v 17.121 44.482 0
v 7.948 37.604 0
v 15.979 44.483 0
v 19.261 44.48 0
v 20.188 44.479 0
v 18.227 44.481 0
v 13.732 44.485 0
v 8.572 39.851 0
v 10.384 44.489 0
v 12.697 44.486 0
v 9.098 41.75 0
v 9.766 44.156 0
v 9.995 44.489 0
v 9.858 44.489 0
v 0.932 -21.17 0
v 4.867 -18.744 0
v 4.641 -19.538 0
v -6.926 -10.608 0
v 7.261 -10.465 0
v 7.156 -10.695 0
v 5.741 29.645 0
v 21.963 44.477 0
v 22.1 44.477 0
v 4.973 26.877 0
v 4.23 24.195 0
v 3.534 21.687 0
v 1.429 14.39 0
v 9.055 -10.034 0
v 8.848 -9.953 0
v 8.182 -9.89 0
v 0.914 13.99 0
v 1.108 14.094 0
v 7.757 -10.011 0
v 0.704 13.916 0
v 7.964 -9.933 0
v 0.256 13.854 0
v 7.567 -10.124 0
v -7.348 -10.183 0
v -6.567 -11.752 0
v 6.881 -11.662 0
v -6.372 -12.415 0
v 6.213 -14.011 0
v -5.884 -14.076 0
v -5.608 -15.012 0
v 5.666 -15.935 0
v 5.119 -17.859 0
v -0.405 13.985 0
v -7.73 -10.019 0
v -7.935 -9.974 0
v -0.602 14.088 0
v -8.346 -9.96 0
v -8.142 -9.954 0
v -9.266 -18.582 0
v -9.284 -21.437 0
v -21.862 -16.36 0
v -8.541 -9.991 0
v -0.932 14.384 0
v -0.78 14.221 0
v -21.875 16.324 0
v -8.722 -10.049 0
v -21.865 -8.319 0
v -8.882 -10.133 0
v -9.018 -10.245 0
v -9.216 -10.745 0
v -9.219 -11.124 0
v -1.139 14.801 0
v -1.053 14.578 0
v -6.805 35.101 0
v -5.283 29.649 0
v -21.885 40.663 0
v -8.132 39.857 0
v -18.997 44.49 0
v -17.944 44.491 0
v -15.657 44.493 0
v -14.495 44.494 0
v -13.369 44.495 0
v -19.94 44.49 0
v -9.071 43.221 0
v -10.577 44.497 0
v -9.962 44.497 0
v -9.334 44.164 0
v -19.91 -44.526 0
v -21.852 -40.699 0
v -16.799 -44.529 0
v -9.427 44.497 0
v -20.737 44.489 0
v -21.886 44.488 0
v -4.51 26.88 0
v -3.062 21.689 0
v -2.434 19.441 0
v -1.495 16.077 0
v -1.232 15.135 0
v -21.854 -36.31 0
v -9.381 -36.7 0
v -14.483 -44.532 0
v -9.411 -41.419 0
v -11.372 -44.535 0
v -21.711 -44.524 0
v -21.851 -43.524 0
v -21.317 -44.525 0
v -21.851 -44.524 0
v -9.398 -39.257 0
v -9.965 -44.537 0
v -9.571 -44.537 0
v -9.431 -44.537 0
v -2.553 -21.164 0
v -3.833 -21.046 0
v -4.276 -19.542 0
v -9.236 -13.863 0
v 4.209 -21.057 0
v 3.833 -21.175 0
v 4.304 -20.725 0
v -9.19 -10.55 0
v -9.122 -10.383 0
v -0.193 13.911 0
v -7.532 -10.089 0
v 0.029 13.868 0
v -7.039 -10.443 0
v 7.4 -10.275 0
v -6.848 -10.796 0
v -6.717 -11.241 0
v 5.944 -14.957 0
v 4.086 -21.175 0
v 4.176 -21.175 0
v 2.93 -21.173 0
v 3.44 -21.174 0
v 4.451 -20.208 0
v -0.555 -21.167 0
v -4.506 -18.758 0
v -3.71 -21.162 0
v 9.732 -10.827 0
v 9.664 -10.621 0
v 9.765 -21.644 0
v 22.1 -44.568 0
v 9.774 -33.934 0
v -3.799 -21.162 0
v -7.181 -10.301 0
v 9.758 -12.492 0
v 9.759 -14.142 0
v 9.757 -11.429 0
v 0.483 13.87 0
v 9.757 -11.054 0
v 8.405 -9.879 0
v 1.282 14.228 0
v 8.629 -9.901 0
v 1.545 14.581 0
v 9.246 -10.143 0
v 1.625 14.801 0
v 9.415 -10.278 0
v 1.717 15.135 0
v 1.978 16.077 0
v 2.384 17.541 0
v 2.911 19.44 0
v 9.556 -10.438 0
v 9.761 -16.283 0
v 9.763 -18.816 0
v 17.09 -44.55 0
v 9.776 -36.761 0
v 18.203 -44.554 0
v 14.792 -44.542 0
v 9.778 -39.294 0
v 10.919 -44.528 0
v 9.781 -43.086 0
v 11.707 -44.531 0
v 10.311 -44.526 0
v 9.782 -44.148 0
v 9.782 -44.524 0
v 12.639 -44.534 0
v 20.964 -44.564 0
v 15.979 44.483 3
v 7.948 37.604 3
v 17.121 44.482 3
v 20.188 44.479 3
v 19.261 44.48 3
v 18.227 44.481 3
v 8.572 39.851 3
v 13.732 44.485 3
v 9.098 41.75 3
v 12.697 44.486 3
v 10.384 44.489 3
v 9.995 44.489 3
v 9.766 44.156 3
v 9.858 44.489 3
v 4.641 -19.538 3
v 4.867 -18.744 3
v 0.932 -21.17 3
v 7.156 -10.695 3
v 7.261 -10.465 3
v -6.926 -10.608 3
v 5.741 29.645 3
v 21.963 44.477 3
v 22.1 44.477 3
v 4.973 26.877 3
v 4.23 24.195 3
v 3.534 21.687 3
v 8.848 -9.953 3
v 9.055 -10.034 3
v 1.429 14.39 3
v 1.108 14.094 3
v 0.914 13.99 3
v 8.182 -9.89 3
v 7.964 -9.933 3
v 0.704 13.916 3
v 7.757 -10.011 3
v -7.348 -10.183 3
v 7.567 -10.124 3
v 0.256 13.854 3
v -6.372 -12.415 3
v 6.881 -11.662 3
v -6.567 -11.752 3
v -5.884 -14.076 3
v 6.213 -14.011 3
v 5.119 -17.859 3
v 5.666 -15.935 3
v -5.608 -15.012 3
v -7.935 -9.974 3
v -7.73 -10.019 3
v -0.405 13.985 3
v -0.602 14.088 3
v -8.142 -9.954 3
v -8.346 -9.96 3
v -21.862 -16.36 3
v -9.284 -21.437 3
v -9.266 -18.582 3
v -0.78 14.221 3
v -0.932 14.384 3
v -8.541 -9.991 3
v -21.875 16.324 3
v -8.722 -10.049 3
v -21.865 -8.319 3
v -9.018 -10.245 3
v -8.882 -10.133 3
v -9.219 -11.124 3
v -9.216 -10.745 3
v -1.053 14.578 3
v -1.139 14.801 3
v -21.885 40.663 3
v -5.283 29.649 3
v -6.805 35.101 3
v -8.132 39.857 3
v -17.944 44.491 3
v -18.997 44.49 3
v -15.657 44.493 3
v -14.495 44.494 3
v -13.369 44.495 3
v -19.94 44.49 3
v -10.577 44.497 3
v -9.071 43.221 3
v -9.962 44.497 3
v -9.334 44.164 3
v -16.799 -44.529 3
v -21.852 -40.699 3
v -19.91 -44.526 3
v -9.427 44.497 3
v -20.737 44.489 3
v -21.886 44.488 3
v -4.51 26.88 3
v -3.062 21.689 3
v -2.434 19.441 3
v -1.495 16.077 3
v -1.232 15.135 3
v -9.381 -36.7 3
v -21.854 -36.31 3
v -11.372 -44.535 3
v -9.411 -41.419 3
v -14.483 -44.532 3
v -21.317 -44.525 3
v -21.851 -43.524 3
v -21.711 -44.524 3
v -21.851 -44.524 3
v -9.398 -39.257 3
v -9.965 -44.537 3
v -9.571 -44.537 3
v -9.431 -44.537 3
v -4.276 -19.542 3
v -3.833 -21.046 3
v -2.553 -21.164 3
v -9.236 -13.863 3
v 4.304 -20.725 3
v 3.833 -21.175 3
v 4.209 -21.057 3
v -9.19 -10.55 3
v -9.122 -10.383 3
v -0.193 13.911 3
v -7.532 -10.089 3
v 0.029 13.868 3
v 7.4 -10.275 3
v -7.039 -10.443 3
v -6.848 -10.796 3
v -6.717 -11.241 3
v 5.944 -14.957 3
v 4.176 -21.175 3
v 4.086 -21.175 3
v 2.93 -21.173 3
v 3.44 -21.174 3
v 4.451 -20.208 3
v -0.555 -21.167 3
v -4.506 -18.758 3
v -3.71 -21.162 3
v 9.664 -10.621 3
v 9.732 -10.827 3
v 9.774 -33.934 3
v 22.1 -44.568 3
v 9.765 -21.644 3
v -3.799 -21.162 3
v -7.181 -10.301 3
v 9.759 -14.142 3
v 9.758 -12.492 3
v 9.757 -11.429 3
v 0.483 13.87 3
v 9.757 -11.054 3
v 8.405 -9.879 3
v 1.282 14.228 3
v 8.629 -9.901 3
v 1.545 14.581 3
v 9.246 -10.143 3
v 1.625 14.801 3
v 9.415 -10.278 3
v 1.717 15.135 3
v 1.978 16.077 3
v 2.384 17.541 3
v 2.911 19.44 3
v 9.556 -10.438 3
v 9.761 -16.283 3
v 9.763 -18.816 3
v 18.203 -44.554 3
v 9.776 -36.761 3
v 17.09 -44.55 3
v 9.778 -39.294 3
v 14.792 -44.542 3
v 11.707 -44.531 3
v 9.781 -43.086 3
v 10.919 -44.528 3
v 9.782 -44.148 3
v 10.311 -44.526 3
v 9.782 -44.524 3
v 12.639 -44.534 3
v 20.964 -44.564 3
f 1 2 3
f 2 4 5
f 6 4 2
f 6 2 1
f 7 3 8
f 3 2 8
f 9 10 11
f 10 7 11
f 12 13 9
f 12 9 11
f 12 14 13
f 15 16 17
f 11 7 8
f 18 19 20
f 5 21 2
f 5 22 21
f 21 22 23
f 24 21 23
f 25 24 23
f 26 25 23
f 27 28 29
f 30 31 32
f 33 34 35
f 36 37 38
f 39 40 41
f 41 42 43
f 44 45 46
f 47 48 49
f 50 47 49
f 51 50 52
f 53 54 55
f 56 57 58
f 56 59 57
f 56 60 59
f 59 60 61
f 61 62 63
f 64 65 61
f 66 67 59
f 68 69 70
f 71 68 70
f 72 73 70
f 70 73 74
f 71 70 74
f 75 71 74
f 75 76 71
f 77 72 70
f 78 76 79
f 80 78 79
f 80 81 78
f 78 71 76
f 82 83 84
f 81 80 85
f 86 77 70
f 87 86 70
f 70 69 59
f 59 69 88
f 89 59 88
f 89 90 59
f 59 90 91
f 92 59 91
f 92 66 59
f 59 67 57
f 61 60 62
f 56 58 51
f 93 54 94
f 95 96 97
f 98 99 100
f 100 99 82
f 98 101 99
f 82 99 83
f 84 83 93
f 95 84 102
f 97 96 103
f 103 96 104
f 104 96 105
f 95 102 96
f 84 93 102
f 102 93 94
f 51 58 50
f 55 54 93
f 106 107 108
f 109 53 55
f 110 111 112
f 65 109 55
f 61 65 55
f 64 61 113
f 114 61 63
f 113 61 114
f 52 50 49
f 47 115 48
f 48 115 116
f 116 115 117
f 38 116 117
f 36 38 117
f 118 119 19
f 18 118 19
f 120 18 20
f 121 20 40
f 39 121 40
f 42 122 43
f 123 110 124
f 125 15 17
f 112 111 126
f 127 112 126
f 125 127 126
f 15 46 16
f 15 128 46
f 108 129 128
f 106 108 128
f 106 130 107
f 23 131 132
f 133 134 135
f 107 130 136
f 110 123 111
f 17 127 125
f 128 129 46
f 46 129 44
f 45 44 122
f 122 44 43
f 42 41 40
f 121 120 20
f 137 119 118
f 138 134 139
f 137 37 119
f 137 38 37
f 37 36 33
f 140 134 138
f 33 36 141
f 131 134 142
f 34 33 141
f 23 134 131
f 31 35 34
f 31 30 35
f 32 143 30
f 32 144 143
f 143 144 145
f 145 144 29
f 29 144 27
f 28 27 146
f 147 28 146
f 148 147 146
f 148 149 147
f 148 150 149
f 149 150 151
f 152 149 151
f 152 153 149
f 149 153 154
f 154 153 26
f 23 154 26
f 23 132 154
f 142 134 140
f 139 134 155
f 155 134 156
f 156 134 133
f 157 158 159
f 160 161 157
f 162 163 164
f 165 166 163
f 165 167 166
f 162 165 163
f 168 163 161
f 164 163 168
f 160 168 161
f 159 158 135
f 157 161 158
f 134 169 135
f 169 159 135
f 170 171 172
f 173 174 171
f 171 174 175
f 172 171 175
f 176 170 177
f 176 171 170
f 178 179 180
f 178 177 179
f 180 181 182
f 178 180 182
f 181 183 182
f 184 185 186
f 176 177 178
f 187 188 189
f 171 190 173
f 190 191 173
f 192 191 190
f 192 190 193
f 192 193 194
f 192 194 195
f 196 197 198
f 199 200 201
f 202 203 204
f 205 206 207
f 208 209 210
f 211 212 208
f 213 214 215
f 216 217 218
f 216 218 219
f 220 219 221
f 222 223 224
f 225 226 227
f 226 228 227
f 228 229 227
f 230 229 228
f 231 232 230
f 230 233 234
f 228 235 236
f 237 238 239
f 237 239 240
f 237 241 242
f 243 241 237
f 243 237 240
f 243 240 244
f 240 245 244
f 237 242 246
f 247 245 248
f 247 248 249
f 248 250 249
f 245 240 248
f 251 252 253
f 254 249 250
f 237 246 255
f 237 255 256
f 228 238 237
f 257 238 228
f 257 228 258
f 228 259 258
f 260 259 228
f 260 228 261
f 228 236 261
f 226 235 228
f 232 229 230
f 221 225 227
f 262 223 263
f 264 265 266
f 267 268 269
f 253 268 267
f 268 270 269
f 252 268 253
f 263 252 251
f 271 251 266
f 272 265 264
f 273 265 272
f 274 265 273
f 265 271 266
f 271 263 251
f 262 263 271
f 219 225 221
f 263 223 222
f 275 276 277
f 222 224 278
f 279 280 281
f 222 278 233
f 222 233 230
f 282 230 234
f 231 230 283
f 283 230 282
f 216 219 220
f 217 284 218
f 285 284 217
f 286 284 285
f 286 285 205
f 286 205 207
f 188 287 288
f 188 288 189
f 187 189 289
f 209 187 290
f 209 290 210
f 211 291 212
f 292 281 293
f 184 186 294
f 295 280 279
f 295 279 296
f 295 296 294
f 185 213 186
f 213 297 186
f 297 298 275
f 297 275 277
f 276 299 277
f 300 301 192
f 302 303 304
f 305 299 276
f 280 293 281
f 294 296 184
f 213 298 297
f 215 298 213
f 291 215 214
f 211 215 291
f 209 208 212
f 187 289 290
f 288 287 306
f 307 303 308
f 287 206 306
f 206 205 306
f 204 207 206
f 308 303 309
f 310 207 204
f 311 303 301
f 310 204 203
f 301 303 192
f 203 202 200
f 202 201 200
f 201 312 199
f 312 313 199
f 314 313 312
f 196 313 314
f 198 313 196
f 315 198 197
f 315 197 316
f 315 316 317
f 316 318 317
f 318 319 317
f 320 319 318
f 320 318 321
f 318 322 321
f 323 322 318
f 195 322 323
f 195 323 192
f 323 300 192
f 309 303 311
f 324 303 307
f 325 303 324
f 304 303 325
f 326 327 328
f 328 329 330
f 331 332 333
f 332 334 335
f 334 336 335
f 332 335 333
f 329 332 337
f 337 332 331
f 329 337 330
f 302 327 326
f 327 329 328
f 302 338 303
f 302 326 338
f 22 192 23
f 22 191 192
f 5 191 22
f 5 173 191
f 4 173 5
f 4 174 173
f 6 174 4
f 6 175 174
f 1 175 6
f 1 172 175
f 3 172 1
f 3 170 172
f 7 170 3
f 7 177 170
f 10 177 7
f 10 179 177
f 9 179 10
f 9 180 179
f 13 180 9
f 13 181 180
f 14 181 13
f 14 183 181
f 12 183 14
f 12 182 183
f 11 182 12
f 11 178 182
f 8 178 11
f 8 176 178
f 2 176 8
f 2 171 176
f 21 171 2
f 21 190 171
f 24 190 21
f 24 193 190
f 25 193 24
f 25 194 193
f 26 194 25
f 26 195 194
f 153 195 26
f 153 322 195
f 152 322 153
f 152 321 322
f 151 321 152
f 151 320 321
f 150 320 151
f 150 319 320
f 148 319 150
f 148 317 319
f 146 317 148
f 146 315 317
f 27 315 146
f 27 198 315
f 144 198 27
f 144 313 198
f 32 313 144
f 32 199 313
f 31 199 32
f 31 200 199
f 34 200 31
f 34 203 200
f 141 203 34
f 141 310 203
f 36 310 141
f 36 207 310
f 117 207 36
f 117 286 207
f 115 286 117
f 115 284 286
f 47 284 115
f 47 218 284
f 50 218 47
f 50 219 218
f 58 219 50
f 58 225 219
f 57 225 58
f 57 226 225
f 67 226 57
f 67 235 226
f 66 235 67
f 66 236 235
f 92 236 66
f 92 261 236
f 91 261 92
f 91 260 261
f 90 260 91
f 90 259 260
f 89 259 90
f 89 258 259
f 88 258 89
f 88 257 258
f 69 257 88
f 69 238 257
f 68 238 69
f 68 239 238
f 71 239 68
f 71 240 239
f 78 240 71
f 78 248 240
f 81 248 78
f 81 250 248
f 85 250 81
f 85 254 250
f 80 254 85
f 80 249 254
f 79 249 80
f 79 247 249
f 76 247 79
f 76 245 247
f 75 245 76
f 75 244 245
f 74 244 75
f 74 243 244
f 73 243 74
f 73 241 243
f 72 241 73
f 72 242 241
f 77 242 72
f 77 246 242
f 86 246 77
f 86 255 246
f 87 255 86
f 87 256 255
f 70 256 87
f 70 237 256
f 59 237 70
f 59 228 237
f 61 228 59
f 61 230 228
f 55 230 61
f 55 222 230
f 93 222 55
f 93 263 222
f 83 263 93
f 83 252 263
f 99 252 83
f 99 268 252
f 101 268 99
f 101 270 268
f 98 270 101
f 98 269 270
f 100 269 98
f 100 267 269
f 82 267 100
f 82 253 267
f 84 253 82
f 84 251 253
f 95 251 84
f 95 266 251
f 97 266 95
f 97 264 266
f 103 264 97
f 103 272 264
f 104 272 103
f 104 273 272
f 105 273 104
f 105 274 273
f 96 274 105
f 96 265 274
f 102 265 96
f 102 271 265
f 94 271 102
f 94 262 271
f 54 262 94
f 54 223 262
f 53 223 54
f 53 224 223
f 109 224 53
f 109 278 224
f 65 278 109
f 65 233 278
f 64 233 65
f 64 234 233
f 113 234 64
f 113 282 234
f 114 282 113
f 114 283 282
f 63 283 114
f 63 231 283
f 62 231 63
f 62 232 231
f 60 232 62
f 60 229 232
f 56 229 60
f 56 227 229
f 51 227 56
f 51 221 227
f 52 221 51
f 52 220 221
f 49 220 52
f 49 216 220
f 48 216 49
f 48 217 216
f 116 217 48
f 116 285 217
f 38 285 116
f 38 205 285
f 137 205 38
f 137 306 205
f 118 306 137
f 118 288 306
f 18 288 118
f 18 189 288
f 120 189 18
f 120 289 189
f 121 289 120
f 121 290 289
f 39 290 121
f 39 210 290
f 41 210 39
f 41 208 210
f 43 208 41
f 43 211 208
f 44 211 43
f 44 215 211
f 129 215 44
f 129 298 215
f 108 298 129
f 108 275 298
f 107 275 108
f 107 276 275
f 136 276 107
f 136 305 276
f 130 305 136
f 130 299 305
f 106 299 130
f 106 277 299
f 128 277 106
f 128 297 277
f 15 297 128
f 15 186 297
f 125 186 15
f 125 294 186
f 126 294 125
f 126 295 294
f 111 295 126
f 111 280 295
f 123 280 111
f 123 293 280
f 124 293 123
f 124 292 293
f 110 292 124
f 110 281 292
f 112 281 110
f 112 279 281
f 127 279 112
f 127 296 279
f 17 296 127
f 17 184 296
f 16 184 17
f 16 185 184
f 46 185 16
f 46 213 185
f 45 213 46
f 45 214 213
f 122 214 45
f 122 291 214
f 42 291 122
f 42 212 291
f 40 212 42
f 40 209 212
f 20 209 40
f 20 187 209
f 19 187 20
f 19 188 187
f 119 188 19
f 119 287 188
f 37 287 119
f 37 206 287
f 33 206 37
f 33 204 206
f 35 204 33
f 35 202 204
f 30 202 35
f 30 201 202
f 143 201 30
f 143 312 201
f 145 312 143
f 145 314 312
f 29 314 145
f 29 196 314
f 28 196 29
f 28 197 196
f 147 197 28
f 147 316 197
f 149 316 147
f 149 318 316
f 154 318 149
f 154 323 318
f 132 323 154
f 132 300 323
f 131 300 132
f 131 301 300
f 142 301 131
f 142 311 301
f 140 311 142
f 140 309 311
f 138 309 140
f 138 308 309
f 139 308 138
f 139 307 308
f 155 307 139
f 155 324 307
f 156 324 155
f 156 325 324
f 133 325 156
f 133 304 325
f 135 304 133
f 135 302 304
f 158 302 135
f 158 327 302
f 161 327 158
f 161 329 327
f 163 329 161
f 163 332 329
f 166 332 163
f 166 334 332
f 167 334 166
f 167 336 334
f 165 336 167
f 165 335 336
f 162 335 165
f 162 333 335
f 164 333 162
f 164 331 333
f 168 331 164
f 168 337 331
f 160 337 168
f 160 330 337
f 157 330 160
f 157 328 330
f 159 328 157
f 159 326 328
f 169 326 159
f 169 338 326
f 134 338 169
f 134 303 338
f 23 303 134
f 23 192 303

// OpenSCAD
// Generated from 交通部公路局（原交通部公路總局）「新式號牌使用之英文字、數字字體」author trace
fudge = 0.1;

module glyph_2012_M(h = 3) {
  difference() {
    linear_extrude(height = h)
      polygon(points = [[-21.8864, 44.4882], [-21.886, 43.4885], [-21.8849, 40.6634], [-21.8831, 36.2737], [-21.8808, 30.58], [-21.8781, 23.8432], [-21.8751, 16.3241], [-21.8719, 8.2834], [-21.8686, -0.018], [-21.8653, -8.3195], [-21.862, -16.3601], [-21.859, -23.8792], [-21.8563, -30.616], [-21.854, -36.3097], [-21.8523, -40.6994], [-21.8511, -43.5245], [-21.8507, -44.5242], [-21.7113, -44.5243], [-21.3171, -44.5248], [-20.7046, -44.5254], [-19.9102, -44.5262], [-18.9702, -44.5272], [-17.9211, -44.5283], [-16.7992, -44.5295], [-15.6409, -44.5307], [-14.4827, -44.5319], [-13.3608, -44.5331], [-12.3116, -44.5342], [-11.3717, -44.5352], [-10.5773, -44.536], [-9.9648, -44.5366], [-9.5706, -44.5371], [-9.4311, -44.5372], [-9.4287, -44.1577], [-9.4219, -43.0852], [-9.4113, -41.4186], [-9.3976, -39.2571], [-9.3813, -36.6996], [-9.3632, -33.845], [-9.3438, -30.7924], [-9.3238, -27.6409], [-9.3038, -24.4893], [-9.2844, -21.4368], [-9.2662, -18.5822], [-9.25, -16.0247], [-9.2363, -13.8631], [-9.2257, -12.1966], [-9.2189, -11.1241], [-9.2164, -10.7446], [-9.1902, -10.55], [-9.1221, -10.3835], [-9.0176, -10.2448], [-8.8824, -10.1334], [-8.7218, -10.0491], [-8.5412, -9.9914], [-8.3463, -9.9599], [-8.1425, -9.9543], [-7.9352, -9.9742], [-7.73, -10.0192], [-7.5323, -10.0889], [-7.3476, -10.183], [-7.1814, -10.3011], [-7.0392, -10.4428], [-6.9264, -10.6078], [-6.8485, -10.7956], [-6.8143, -10.912], [-6.7175, -11.241], [-6.5671, -11.7522], [-6.3721, -12.4153], [-6.1413, -13.1999], [-5.8837, -14.0756], [-5.6083, -15.0121], [-5.3239, -15.9789], [-5.0395, -16.9457], [-4.764, -17.8821], [-4.5064, -18.7578], [-4.2757, -19.5424], [-4.0806, -20.2055], [-3.9302, -20.7168], [-3.8334, -21.0458], [-3.7992, -21.1622], [-3.7096, -21.1624], [-3.4565, -21.1628], [-3.0632, -21.1634], [-2.5531, -21.1642], [-1.9496, -21.1652], [-1.2759, -21.1663], [-0.5555, -21.1675], [0.1883, -21.1687], [0.932, -21.1699], [1.6524, -21.1711], [2.3261, -21.1722], [2.9296, -21.1732], [3.4397, -21.174], [3.833, -21.1747], [4.0861, -21.1751], [4.1757, -21.1752], [4.2092, -21.0575], [4.3038, -20.7249], [4.4507, -20.208], [4.6413, -19.5376], [4.8669, -18.7444], [5.1186, -17.8591], [5.3878, -16.9124], [5.6657, -15.935], [5.9436, -14.9575], [6.2128, -14.0108], [6.4645, -13.1255], [6.69, -12.3323], [6.8806, -11.6619], [7.0276, -11.1451], [7.1222, -10.8124], [7.1557, -10.6947], [7.2611, -10.4651], [7.4002, -10.2755], [7.5674, -10.1245], [7.7571, -10.0108], [7.9637, -9.9329], [8.1817, -9.8896], [8.4054, -9.8795], [8.6293, -9.9011], [8.8478, -9.9531], [9.0552, -10.0342], [9.2462, -10.1429], [9.4149, -10.2779], [9.5559, -10.4379], [9.6636, -10.6214], [9.7324, -10.8271], [9.7567, -11.0536], [9.7569, -11.4295], [9.7578, -12.4918], [9.759, -14.1424], [9.7606, -16.2834], [9.7626, -18.8165], [9.7647, -21.6439], [9.767, -24.6674], [9.7694, -27.7889], [9.7718, -30.9104], [9.7741, -33.9339], [9.7762, -36.7612], [9.7782, -39.2944], [9.7798, -41.4353], [9.781, -43.086], [9.7819, -44.1483], [9.7821, -44.5242], [9.9205, -44.5247], [10.3114, -44.5261], [10.9189, -44.5282], [11.7069, -44.531], [12.6392, -44.5344], [13.6797, -44.5381], [14.7924, -44.542], [15.9413, -44.5461], [17.0901, -44.5502], [18.2028, -44.5542], [19.2434, -44.5579], [20.1756, -44.5612], [20.9636, -44.564], [21.5711, -44.5662], [21.962, -44.5676], [22.1004, -44.5681], [22.1004, -43.5681], [22.1004, -40.7419], [22.1004, -36.3506], [22.1004, -30.6548], [22.1004, -23.9156], [22.1004, -16.3937], [22.1004, -8.3501], [22.1004, -0.0456], [22.1004, 8.2589], [22.1004, 16.3025], [22.1004, 23.8244], [22.1004, 30.5637], [22.1004, 36.2594], [22.1004, 40.6508], [22.1004, 43.4769], [22.1004, 44.477], [21.9629, 44.4771], [21.5743, 44.4775], [20.9706, 44.4781], [20.1875, 44.4789], [19.261, 44.4798], [18.2268, 44.4809], [17.1209, 44.482], [15.9792, 44.4832], [14.8375, 44.4843], [13.7316, 44.4854], [12.6974, 44.4865], [11.7709, 44.4874], [10.9878, 44.4882], [10.3841, 44.4888], [9.9955, 44.4892], [9.858, 44.4894], [9.7656, 44.1559], [9.5043, 43.2137], [9.0982, 41.7496], [8.5716, 39.8506], [7.9484, 37.6037], [7.2529, 35.0959], [6.5092, 32.4142], [5.7413, 29.6454], [4.9734, 26.8767], [4.2297, 24.1949], [3.5342, 21.6871], [2.911, 19.4403], [2.3844, 17.5413], [1.9783, 16.0772], [1.717, 15.1349], [1.6246, 14.8015], [1.545, 14.5814], [1.429, 14.3901], [1.2818, 14.2278], [1.1084, 14.0945], [0.9141, 13.9905], [0.7038, 13.9157], [0.4829, 13.8703], [0.2564, 13.8544], [0.0295, 13.8681], [-0.1927, 13.9115], [-0.4051, 13.9847], [-0.6025, 14.0879], [-0.7797, 14.221], [-0.9317, 14.3842], [-1.0533, 14.5777], [-1.1394, 14.8015], [-1.2324, 15.135], [-1.4955, 16.0775], [-1.9042, 17.542], [-2.4343, 19.4415], [-3.0616, 21.689], [-3.7617, 24.1975], [-4.5103, 26.88], [-5.2833, 29.6495], [-6.0562, 32.419], [-6.8048, 35.1015], [-7.5049, 37.61], [-8.1322, 39.8575], [-8.6623, 41.757], [-9.071, 43.2215], [-9.3341, 44.164], [-9.4271, 44.4975], [-9.5671, 44.4974], [-9.9625, 44.4971], [-10.5769, 44.4967], [-11.3739, 44.4961], [-12.3169, 44.4954], [-13.3693, 44.4946], [-14.4948, 44.4937], [-15.6568, 44.4929], [-16.8188, 44.492], [-17.9442, 44.4911], [-18.9967, 44.4904], [-19.9397, 44.4896], [-20.7366, 44.4891], [-21.3511, 44.4886], [-21.7465, 44.4883]]);
  }
}

glyph_2012_M();
